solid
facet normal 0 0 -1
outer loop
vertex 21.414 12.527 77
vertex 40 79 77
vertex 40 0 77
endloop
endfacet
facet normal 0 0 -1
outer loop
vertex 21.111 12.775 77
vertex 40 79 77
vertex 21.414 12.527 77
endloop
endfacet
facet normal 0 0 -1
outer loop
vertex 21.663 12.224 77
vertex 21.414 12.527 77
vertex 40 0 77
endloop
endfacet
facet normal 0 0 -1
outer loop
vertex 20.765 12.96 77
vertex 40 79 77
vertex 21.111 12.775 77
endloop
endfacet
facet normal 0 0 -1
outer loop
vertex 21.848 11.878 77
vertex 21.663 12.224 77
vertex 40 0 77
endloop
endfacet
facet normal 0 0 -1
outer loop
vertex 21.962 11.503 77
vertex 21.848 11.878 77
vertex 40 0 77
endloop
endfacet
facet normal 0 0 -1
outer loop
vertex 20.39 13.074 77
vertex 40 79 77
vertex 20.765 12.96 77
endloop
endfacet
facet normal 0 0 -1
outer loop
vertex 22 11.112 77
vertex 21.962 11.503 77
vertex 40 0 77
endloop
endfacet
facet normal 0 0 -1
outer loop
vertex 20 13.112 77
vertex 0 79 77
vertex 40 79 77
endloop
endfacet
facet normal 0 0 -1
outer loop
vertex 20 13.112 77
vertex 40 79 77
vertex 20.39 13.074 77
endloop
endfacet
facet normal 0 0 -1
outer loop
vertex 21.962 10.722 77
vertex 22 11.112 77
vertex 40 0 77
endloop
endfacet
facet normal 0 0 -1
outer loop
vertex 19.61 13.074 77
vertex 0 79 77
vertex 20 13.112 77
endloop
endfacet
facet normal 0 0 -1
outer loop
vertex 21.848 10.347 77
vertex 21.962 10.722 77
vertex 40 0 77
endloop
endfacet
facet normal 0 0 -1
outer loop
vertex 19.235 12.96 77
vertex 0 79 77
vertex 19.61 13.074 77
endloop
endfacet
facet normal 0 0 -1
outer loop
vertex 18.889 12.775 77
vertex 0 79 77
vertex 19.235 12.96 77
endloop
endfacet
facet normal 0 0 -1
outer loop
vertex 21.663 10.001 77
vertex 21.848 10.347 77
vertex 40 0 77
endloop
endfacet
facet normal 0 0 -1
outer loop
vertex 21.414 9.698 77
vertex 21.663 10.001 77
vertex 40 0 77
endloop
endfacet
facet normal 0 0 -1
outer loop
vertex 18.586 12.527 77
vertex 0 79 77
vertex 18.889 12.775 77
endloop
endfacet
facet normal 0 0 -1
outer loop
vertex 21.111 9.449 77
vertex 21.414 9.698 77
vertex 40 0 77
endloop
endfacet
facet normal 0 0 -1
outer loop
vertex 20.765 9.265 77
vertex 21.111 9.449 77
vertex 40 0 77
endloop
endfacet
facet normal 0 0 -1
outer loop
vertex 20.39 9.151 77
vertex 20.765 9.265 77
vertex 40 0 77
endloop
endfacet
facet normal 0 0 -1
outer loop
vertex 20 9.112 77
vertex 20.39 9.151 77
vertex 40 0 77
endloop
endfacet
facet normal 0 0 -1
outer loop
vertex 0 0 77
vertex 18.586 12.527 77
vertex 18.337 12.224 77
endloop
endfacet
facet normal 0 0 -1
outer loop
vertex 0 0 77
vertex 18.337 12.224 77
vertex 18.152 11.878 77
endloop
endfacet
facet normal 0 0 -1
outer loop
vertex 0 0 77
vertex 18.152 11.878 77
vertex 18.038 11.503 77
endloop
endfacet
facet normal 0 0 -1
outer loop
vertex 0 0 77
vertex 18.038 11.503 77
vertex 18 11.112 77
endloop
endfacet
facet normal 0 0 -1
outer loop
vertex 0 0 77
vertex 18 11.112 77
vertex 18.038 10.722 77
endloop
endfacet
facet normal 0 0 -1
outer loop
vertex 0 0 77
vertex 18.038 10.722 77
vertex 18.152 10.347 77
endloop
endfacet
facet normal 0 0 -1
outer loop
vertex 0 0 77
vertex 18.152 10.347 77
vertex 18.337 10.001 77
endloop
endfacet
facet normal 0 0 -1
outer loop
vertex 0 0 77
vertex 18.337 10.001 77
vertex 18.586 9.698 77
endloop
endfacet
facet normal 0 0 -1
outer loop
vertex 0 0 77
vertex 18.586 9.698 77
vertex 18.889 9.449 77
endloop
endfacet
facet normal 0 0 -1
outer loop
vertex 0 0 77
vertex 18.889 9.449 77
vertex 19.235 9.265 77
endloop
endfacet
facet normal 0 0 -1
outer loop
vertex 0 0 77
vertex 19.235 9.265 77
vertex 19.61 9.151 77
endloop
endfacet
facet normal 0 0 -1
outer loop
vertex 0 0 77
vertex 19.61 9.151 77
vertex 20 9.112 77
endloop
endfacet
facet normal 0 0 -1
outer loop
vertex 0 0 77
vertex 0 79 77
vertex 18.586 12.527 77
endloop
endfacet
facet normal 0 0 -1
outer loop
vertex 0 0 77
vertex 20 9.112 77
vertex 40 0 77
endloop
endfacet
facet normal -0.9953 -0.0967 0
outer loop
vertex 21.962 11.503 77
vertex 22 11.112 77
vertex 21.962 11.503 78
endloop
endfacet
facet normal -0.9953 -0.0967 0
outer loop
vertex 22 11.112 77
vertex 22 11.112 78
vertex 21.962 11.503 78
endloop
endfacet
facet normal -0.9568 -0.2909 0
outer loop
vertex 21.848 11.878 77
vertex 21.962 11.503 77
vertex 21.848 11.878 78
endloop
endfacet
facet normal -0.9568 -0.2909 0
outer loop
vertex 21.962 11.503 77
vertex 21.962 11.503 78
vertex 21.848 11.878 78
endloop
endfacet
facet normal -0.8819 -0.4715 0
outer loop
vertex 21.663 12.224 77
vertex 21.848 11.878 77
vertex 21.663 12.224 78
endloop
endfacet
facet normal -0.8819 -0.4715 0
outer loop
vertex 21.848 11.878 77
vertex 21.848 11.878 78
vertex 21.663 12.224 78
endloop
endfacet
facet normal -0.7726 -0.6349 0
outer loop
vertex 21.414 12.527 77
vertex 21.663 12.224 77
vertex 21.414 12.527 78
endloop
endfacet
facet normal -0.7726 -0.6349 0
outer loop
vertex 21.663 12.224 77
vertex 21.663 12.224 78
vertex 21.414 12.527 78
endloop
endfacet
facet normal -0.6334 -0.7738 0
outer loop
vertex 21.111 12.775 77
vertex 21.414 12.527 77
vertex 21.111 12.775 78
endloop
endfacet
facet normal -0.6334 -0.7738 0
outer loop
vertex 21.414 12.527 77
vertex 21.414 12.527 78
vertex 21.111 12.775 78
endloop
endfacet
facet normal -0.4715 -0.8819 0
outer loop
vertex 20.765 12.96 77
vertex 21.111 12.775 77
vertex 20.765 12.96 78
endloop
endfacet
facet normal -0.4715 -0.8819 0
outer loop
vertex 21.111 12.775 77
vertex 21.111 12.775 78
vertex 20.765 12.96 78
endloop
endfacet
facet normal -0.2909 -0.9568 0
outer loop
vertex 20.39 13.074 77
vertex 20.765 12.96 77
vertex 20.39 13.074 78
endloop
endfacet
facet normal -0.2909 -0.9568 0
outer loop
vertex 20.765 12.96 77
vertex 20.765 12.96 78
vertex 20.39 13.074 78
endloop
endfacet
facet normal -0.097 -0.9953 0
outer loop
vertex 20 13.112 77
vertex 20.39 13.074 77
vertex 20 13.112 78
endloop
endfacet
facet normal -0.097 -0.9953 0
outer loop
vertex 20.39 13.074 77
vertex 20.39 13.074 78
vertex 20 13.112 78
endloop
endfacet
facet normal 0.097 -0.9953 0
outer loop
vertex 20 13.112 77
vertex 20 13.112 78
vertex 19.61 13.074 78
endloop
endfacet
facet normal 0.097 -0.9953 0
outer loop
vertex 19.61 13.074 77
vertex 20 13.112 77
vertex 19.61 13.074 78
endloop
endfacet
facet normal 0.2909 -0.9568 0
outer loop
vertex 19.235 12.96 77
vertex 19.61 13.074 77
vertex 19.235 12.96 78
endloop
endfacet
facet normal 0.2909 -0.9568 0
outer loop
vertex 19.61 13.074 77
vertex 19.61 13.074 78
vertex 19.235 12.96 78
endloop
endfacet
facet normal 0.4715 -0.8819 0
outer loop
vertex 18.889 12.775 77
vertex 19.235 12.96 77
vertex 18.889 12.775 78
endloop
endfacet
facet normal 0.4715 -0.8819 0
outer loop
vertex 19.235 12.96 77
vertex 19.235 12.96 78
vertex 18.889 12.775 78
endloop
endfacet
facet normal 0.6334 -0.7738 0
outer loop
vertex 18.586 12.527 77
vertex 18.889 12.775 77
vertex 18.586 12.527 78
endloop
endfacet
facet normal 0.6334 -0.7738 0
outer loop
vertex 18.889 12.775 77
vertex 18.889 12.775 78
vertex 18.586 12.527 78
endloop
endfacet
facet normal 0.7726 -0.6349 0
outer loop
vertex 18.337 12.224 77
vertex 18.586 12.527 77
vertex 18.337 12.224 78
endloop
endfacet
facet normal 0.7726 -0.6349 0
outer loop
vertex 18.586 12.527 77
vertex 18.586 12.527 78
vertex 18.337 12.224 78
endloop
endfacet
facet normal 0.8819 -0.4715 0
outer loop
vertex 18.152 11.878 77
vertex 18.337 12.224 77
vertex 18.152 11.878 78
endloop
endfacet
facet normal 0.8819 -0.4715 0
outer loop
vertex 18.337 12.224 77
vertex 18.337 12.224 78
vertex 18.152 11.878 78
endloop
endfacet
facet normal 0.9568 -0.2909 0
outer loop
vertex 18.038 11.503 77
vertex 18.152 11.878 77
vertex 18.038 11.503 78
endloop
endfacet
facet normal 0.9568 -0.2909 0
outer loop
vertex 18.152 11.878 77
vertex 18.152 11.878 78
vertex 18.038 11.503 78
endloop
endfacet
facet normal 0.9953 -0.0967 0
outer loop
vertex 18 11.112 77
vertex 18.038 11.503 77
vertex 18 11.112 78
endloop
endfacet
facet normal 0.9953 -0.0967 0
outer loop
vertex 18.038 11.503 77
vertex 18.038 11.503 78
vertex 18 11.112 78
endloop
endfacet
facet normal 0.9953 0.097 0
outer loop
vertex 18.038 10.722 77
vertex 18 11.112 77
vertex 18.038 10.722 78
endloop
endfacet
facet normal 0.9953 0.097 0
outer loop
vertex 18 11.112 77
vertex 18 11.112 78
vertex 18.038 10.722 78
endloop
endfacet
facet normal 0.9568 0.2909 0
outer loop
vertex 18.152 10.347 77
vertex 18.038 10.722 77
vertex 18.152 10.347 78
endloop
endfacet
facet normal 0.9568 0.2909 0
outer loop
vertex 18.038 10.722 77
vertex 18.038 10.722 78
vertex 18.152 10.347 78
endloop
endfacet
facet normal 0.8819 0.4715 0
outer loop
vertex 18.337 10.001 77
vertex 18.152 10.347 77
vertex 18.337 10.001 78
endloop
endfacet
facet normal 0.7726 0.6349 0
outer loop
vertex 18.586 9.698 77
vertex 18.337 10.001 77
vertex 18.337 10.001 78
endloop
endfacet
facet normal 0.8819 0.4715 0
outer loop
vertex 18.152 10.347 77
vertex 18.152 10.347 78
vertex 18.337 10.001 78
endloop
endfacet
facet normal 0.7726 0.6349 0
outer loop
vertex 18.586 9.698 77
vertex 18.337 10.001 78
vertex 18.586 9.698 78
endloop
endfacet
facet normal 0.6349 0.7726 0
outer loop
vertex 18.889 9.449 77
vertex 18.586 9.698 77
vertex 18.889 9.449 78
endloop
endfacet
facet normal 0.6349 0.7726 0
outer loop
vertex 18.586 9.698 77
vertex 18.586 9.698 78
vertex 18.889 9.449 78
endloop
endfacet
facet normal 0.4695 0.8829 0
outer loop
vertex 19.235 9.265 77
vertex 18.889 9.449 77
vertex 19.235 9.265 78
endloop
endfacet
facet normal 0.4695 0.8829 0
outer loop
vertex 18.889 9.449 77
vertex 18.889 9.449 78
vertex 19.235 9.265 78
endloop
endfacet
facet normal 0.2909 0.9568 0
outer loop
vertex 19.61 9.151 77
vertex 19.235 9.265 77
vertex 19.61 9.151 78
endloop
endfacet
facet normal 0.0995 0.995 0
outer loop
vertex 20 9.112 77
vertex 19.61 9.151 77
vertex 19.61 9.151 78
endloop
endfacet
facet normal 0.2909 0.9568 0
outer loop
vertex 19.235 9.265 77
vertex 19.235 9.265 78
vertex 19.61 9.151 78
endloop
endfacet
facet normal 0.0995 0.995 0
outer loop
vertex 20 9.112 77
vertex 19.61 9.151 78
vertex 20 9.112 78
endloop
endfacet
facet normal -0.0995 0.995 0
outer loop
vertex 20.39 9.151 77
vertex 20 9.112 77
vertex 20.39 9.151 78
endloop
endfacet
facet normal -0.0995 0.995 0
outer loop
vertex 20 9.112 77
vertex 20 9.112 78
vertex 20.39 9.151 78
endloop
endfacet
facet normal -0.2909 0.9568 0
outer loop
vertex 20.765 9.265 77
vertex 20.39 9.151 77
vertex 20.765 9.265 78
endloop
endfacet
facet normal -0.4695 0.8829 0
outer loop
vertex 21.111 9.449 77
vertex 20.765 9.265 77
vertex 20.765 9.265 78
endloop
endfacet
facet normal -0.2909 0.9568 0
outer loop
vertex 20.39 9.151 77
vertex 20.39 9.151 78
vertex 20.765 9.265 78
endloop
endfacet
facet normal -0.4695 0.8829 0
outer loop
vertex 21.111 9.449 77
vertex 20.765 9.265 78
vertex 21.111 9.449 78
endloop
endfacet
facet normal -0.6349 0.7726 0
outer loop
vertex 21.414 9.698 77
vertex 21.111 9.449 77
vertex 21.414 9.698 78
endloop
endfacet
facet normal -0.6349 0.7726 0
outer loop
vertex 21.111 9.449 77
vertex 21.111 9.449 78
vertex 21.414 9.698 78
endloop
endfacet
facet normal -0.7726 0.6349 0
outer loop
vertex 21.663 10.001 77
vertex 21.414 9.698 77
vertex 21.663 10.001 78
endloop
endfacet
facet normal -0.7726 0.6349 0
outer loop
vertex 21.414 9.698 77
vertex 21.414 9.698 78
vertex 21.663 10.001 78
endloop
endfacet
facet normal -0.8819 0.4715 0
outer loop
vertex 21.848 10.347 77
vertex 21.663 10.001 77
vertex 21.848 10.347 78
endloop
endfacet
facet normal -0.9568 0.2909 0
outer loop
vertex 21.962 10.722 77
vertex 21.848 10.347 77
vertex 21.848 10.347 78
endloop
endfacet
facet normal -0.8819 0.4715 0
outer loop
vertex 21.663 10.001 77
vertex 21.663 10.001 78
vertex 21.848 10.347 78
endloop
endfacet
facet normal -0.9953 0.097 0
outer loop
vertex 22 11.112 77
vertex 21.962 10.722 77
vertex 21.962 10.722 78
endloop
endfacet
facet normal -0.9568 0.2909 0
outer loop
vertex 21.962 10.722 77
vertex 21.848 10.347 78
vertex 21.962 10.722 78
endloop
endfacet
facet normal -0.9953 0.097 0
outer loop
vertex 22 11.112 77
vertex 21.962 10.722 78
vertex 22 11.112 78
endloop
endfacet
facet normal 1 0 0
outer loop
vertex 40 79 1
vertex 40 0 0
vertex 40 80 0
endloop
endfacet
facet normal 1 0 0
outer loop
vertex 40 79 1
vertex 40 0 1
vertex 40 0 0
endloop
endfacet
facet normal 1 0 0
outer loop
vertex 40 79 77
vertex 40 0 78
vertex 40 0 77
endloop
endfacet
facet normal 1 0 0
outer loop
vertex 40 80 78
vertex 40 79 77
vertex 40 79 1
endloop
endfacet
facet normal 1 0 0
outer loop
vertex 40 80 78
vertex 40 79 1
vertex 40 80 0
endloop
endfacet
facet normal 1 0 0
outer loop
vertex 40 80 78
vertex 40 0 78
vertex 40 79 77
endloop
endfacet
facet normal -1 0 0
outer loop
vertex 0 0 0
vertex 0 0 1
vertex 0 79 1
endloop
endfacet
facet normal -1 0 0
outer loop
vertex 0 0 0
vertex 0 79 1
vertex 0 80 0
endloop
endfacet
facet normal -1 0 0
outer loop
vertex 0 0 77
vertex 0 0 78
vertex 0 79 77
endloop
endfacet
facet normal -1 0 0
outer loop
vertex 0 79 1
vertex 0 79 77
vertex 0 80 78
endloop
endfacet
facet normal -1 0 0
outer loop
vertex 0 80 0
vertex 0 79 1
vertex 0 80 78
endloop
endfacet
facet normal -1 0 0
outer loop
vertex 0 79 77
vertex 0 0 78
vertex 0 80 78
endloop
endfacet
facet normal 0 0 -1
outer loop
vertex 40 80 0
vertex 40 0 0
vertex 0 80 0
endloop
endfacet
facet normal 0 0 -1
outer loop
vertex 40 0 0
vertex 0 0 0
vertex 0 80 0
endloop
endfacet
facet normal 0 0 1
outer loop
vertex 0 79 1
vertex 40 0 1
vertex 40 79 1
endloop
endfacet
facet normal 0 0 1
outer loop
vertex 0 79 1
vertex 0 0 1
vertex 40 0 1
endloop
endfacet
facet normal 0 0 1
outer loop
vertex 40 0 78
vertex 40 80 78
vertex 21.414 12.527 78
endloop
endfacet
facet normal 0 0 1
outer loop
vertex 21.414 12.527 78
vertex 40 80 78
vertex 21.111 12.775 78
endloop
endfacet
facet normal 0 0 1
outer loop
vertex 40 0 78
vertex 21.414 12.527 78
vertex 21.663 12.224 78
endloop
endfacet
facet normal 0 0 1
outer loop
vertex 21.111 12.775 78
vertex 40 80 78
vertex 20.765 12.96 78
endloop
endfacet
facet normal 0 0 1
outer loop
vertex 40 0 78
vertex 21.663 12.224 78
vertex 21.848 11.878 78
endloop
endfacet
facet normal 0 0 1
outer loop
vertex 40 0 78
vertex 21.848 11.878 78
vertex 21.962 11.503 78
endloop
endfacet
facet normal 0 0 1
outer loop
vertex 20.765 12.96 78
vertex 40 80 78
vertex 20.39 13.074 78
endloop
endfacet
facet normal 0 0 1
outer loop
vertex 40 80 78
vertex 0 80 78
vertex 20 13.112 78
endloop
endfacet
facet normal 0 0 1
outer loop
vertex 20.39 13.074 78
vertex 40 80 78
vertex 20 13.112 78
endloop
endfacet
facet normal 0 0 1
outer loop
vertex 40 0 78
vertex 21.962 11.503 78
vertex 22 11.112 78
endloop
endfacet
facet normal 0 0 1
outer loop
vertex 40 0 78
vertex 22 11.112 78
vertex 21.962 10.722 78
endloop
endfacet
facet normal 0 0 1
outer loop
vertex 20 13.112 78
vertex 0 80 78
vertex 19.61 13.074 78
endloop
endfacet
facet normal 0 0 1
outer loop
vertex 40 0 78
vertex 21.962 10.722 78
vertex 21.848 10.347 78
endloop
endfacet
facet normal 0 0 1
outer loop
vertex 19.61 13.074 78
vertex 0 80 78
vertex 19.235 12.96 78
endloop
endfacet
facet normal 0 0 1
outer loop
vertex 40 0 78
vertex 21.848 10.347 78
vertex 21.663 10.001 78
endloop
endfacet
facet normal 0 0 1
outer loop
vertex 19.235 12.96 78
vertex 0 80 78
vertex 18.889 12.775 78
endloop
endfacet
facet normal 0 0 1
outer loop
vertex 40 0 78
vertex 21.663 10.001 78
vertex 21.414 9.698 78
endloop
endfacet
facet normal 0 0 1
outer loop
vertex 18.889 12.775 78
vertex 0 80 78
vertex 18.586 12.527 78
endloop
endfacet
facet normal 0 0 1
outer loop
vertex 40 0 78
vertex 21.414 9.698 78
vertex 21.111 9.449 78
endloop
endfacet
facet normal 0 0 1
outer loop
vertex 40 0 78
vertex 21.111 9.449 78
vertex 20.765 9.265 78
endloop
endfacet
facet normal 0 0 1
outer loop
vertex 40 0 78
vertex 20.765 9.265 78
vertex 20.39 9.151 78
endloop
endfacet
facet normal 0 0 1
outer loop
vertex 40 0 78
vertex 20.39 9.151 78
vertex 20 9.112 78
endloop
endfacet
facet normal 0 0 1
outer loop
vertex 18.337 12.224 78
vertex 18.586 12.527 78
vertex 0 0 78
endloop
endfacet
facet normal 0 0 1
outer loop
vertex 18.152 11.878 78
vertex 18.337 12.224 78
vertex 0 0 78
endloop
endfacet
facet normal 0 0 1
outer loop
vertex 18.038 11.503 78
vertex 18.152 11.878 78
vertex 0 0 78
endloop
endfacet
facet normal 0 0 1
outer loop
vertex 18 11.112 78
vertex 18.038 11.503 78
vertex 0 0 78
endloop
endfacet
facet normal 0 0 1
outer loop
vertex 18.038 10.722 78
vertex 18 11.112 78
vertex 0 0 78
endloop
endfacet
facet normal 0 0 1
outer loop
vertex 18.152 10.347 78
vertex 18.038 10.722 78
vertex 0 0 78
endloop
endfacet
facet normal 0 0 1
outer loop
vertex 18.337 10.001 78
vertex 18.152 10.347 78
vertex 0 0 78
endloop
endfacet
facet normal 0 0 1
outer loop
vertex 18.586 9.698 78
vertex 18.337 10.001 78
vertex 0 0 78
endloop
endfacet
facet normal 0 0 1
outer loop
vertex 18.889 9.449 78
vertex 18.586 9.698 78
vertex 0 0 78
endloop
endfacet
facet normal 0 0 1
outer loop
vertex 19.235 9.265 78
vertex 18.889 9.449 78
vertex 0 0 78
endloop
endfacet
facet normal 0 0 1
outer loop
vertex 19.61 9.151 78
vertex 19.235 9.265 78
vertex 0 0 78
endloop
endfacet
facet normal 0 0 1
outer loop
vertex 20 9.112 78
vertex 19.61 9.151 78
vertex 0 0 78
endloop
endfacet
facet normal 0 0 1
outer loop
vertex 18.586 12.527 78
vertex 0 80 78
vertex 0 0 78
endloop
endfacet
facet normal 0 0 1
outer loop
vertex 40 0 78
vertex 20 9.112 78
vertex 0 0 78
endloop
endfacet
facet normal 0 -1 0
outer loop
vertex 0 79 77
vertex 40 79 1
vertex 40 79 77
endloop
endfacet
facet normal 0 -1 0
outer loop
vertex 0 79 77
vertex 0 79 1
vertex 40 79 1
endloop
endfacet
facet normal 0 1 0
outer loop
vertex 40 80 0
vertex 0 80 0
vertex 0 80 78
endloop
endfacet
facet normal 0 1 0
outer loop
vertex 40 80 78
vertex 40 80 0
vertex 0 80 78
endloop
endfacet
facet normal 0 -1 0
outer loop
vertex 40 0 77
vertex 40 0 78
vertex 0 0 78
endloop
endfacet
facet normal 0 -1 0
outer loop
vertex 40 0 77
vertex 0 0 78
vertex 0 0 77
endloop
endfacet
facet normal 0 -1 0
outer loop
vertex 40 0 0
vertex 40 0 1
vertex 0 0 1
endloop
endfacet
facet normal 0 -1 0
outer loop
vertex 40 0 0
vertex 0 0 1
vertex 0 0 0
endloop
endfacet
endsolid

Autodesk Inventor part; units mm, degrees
ref_plane "YZ Plane" through (0, 0, 0) normal (1, 0, 0) x (0, 1, 0)
ref_plane "XZ Plane" through (0, 0, 0) normal (0, 1, 0) x (-1, 0, 0)
ref_plane "XY Plane" through (0, 0, 0) normal (0, 0, 1) x (1, 0, 0)
sketch "Sketch2" plane through (0, 0, 0) normal (1, 0, 0) x (0, 1, 0)
  line L0 (0, 0) -> (80, 0)
  line L1 (80, 0) -> (80, 78)
  line L2 (80, 78) -> (0, 78)
  line L3 (0, 78) -> (0, 0)
  dimension "d3" = 80
  dimension "d4" = 78
extrude "Extrusion2" add sketch "Sketch2" along normal blind 40
shell "Shell1" thickness 1 removed faces 3 at (13.3333, 0, 52) at (0, 26.6667, 52) at (40, 26.6667, 52)
sketch "Sketch3" plane through (0, 0, 78) normal (0, 0, 1) x (1, 0, 0)
  line L0 (0, 0) -> (40, 0) projected
  line L1 (0, 80) -> (40, 80) projected
  circle A0 centre (20, 11.1124) radius 2
  dimension "d8" = 4
extrude "Extrusion3" cut sketch "Sketch3" against normal blind 1
properties part number "MAN_BASIS_SECONDARY_STRUCTURE"
